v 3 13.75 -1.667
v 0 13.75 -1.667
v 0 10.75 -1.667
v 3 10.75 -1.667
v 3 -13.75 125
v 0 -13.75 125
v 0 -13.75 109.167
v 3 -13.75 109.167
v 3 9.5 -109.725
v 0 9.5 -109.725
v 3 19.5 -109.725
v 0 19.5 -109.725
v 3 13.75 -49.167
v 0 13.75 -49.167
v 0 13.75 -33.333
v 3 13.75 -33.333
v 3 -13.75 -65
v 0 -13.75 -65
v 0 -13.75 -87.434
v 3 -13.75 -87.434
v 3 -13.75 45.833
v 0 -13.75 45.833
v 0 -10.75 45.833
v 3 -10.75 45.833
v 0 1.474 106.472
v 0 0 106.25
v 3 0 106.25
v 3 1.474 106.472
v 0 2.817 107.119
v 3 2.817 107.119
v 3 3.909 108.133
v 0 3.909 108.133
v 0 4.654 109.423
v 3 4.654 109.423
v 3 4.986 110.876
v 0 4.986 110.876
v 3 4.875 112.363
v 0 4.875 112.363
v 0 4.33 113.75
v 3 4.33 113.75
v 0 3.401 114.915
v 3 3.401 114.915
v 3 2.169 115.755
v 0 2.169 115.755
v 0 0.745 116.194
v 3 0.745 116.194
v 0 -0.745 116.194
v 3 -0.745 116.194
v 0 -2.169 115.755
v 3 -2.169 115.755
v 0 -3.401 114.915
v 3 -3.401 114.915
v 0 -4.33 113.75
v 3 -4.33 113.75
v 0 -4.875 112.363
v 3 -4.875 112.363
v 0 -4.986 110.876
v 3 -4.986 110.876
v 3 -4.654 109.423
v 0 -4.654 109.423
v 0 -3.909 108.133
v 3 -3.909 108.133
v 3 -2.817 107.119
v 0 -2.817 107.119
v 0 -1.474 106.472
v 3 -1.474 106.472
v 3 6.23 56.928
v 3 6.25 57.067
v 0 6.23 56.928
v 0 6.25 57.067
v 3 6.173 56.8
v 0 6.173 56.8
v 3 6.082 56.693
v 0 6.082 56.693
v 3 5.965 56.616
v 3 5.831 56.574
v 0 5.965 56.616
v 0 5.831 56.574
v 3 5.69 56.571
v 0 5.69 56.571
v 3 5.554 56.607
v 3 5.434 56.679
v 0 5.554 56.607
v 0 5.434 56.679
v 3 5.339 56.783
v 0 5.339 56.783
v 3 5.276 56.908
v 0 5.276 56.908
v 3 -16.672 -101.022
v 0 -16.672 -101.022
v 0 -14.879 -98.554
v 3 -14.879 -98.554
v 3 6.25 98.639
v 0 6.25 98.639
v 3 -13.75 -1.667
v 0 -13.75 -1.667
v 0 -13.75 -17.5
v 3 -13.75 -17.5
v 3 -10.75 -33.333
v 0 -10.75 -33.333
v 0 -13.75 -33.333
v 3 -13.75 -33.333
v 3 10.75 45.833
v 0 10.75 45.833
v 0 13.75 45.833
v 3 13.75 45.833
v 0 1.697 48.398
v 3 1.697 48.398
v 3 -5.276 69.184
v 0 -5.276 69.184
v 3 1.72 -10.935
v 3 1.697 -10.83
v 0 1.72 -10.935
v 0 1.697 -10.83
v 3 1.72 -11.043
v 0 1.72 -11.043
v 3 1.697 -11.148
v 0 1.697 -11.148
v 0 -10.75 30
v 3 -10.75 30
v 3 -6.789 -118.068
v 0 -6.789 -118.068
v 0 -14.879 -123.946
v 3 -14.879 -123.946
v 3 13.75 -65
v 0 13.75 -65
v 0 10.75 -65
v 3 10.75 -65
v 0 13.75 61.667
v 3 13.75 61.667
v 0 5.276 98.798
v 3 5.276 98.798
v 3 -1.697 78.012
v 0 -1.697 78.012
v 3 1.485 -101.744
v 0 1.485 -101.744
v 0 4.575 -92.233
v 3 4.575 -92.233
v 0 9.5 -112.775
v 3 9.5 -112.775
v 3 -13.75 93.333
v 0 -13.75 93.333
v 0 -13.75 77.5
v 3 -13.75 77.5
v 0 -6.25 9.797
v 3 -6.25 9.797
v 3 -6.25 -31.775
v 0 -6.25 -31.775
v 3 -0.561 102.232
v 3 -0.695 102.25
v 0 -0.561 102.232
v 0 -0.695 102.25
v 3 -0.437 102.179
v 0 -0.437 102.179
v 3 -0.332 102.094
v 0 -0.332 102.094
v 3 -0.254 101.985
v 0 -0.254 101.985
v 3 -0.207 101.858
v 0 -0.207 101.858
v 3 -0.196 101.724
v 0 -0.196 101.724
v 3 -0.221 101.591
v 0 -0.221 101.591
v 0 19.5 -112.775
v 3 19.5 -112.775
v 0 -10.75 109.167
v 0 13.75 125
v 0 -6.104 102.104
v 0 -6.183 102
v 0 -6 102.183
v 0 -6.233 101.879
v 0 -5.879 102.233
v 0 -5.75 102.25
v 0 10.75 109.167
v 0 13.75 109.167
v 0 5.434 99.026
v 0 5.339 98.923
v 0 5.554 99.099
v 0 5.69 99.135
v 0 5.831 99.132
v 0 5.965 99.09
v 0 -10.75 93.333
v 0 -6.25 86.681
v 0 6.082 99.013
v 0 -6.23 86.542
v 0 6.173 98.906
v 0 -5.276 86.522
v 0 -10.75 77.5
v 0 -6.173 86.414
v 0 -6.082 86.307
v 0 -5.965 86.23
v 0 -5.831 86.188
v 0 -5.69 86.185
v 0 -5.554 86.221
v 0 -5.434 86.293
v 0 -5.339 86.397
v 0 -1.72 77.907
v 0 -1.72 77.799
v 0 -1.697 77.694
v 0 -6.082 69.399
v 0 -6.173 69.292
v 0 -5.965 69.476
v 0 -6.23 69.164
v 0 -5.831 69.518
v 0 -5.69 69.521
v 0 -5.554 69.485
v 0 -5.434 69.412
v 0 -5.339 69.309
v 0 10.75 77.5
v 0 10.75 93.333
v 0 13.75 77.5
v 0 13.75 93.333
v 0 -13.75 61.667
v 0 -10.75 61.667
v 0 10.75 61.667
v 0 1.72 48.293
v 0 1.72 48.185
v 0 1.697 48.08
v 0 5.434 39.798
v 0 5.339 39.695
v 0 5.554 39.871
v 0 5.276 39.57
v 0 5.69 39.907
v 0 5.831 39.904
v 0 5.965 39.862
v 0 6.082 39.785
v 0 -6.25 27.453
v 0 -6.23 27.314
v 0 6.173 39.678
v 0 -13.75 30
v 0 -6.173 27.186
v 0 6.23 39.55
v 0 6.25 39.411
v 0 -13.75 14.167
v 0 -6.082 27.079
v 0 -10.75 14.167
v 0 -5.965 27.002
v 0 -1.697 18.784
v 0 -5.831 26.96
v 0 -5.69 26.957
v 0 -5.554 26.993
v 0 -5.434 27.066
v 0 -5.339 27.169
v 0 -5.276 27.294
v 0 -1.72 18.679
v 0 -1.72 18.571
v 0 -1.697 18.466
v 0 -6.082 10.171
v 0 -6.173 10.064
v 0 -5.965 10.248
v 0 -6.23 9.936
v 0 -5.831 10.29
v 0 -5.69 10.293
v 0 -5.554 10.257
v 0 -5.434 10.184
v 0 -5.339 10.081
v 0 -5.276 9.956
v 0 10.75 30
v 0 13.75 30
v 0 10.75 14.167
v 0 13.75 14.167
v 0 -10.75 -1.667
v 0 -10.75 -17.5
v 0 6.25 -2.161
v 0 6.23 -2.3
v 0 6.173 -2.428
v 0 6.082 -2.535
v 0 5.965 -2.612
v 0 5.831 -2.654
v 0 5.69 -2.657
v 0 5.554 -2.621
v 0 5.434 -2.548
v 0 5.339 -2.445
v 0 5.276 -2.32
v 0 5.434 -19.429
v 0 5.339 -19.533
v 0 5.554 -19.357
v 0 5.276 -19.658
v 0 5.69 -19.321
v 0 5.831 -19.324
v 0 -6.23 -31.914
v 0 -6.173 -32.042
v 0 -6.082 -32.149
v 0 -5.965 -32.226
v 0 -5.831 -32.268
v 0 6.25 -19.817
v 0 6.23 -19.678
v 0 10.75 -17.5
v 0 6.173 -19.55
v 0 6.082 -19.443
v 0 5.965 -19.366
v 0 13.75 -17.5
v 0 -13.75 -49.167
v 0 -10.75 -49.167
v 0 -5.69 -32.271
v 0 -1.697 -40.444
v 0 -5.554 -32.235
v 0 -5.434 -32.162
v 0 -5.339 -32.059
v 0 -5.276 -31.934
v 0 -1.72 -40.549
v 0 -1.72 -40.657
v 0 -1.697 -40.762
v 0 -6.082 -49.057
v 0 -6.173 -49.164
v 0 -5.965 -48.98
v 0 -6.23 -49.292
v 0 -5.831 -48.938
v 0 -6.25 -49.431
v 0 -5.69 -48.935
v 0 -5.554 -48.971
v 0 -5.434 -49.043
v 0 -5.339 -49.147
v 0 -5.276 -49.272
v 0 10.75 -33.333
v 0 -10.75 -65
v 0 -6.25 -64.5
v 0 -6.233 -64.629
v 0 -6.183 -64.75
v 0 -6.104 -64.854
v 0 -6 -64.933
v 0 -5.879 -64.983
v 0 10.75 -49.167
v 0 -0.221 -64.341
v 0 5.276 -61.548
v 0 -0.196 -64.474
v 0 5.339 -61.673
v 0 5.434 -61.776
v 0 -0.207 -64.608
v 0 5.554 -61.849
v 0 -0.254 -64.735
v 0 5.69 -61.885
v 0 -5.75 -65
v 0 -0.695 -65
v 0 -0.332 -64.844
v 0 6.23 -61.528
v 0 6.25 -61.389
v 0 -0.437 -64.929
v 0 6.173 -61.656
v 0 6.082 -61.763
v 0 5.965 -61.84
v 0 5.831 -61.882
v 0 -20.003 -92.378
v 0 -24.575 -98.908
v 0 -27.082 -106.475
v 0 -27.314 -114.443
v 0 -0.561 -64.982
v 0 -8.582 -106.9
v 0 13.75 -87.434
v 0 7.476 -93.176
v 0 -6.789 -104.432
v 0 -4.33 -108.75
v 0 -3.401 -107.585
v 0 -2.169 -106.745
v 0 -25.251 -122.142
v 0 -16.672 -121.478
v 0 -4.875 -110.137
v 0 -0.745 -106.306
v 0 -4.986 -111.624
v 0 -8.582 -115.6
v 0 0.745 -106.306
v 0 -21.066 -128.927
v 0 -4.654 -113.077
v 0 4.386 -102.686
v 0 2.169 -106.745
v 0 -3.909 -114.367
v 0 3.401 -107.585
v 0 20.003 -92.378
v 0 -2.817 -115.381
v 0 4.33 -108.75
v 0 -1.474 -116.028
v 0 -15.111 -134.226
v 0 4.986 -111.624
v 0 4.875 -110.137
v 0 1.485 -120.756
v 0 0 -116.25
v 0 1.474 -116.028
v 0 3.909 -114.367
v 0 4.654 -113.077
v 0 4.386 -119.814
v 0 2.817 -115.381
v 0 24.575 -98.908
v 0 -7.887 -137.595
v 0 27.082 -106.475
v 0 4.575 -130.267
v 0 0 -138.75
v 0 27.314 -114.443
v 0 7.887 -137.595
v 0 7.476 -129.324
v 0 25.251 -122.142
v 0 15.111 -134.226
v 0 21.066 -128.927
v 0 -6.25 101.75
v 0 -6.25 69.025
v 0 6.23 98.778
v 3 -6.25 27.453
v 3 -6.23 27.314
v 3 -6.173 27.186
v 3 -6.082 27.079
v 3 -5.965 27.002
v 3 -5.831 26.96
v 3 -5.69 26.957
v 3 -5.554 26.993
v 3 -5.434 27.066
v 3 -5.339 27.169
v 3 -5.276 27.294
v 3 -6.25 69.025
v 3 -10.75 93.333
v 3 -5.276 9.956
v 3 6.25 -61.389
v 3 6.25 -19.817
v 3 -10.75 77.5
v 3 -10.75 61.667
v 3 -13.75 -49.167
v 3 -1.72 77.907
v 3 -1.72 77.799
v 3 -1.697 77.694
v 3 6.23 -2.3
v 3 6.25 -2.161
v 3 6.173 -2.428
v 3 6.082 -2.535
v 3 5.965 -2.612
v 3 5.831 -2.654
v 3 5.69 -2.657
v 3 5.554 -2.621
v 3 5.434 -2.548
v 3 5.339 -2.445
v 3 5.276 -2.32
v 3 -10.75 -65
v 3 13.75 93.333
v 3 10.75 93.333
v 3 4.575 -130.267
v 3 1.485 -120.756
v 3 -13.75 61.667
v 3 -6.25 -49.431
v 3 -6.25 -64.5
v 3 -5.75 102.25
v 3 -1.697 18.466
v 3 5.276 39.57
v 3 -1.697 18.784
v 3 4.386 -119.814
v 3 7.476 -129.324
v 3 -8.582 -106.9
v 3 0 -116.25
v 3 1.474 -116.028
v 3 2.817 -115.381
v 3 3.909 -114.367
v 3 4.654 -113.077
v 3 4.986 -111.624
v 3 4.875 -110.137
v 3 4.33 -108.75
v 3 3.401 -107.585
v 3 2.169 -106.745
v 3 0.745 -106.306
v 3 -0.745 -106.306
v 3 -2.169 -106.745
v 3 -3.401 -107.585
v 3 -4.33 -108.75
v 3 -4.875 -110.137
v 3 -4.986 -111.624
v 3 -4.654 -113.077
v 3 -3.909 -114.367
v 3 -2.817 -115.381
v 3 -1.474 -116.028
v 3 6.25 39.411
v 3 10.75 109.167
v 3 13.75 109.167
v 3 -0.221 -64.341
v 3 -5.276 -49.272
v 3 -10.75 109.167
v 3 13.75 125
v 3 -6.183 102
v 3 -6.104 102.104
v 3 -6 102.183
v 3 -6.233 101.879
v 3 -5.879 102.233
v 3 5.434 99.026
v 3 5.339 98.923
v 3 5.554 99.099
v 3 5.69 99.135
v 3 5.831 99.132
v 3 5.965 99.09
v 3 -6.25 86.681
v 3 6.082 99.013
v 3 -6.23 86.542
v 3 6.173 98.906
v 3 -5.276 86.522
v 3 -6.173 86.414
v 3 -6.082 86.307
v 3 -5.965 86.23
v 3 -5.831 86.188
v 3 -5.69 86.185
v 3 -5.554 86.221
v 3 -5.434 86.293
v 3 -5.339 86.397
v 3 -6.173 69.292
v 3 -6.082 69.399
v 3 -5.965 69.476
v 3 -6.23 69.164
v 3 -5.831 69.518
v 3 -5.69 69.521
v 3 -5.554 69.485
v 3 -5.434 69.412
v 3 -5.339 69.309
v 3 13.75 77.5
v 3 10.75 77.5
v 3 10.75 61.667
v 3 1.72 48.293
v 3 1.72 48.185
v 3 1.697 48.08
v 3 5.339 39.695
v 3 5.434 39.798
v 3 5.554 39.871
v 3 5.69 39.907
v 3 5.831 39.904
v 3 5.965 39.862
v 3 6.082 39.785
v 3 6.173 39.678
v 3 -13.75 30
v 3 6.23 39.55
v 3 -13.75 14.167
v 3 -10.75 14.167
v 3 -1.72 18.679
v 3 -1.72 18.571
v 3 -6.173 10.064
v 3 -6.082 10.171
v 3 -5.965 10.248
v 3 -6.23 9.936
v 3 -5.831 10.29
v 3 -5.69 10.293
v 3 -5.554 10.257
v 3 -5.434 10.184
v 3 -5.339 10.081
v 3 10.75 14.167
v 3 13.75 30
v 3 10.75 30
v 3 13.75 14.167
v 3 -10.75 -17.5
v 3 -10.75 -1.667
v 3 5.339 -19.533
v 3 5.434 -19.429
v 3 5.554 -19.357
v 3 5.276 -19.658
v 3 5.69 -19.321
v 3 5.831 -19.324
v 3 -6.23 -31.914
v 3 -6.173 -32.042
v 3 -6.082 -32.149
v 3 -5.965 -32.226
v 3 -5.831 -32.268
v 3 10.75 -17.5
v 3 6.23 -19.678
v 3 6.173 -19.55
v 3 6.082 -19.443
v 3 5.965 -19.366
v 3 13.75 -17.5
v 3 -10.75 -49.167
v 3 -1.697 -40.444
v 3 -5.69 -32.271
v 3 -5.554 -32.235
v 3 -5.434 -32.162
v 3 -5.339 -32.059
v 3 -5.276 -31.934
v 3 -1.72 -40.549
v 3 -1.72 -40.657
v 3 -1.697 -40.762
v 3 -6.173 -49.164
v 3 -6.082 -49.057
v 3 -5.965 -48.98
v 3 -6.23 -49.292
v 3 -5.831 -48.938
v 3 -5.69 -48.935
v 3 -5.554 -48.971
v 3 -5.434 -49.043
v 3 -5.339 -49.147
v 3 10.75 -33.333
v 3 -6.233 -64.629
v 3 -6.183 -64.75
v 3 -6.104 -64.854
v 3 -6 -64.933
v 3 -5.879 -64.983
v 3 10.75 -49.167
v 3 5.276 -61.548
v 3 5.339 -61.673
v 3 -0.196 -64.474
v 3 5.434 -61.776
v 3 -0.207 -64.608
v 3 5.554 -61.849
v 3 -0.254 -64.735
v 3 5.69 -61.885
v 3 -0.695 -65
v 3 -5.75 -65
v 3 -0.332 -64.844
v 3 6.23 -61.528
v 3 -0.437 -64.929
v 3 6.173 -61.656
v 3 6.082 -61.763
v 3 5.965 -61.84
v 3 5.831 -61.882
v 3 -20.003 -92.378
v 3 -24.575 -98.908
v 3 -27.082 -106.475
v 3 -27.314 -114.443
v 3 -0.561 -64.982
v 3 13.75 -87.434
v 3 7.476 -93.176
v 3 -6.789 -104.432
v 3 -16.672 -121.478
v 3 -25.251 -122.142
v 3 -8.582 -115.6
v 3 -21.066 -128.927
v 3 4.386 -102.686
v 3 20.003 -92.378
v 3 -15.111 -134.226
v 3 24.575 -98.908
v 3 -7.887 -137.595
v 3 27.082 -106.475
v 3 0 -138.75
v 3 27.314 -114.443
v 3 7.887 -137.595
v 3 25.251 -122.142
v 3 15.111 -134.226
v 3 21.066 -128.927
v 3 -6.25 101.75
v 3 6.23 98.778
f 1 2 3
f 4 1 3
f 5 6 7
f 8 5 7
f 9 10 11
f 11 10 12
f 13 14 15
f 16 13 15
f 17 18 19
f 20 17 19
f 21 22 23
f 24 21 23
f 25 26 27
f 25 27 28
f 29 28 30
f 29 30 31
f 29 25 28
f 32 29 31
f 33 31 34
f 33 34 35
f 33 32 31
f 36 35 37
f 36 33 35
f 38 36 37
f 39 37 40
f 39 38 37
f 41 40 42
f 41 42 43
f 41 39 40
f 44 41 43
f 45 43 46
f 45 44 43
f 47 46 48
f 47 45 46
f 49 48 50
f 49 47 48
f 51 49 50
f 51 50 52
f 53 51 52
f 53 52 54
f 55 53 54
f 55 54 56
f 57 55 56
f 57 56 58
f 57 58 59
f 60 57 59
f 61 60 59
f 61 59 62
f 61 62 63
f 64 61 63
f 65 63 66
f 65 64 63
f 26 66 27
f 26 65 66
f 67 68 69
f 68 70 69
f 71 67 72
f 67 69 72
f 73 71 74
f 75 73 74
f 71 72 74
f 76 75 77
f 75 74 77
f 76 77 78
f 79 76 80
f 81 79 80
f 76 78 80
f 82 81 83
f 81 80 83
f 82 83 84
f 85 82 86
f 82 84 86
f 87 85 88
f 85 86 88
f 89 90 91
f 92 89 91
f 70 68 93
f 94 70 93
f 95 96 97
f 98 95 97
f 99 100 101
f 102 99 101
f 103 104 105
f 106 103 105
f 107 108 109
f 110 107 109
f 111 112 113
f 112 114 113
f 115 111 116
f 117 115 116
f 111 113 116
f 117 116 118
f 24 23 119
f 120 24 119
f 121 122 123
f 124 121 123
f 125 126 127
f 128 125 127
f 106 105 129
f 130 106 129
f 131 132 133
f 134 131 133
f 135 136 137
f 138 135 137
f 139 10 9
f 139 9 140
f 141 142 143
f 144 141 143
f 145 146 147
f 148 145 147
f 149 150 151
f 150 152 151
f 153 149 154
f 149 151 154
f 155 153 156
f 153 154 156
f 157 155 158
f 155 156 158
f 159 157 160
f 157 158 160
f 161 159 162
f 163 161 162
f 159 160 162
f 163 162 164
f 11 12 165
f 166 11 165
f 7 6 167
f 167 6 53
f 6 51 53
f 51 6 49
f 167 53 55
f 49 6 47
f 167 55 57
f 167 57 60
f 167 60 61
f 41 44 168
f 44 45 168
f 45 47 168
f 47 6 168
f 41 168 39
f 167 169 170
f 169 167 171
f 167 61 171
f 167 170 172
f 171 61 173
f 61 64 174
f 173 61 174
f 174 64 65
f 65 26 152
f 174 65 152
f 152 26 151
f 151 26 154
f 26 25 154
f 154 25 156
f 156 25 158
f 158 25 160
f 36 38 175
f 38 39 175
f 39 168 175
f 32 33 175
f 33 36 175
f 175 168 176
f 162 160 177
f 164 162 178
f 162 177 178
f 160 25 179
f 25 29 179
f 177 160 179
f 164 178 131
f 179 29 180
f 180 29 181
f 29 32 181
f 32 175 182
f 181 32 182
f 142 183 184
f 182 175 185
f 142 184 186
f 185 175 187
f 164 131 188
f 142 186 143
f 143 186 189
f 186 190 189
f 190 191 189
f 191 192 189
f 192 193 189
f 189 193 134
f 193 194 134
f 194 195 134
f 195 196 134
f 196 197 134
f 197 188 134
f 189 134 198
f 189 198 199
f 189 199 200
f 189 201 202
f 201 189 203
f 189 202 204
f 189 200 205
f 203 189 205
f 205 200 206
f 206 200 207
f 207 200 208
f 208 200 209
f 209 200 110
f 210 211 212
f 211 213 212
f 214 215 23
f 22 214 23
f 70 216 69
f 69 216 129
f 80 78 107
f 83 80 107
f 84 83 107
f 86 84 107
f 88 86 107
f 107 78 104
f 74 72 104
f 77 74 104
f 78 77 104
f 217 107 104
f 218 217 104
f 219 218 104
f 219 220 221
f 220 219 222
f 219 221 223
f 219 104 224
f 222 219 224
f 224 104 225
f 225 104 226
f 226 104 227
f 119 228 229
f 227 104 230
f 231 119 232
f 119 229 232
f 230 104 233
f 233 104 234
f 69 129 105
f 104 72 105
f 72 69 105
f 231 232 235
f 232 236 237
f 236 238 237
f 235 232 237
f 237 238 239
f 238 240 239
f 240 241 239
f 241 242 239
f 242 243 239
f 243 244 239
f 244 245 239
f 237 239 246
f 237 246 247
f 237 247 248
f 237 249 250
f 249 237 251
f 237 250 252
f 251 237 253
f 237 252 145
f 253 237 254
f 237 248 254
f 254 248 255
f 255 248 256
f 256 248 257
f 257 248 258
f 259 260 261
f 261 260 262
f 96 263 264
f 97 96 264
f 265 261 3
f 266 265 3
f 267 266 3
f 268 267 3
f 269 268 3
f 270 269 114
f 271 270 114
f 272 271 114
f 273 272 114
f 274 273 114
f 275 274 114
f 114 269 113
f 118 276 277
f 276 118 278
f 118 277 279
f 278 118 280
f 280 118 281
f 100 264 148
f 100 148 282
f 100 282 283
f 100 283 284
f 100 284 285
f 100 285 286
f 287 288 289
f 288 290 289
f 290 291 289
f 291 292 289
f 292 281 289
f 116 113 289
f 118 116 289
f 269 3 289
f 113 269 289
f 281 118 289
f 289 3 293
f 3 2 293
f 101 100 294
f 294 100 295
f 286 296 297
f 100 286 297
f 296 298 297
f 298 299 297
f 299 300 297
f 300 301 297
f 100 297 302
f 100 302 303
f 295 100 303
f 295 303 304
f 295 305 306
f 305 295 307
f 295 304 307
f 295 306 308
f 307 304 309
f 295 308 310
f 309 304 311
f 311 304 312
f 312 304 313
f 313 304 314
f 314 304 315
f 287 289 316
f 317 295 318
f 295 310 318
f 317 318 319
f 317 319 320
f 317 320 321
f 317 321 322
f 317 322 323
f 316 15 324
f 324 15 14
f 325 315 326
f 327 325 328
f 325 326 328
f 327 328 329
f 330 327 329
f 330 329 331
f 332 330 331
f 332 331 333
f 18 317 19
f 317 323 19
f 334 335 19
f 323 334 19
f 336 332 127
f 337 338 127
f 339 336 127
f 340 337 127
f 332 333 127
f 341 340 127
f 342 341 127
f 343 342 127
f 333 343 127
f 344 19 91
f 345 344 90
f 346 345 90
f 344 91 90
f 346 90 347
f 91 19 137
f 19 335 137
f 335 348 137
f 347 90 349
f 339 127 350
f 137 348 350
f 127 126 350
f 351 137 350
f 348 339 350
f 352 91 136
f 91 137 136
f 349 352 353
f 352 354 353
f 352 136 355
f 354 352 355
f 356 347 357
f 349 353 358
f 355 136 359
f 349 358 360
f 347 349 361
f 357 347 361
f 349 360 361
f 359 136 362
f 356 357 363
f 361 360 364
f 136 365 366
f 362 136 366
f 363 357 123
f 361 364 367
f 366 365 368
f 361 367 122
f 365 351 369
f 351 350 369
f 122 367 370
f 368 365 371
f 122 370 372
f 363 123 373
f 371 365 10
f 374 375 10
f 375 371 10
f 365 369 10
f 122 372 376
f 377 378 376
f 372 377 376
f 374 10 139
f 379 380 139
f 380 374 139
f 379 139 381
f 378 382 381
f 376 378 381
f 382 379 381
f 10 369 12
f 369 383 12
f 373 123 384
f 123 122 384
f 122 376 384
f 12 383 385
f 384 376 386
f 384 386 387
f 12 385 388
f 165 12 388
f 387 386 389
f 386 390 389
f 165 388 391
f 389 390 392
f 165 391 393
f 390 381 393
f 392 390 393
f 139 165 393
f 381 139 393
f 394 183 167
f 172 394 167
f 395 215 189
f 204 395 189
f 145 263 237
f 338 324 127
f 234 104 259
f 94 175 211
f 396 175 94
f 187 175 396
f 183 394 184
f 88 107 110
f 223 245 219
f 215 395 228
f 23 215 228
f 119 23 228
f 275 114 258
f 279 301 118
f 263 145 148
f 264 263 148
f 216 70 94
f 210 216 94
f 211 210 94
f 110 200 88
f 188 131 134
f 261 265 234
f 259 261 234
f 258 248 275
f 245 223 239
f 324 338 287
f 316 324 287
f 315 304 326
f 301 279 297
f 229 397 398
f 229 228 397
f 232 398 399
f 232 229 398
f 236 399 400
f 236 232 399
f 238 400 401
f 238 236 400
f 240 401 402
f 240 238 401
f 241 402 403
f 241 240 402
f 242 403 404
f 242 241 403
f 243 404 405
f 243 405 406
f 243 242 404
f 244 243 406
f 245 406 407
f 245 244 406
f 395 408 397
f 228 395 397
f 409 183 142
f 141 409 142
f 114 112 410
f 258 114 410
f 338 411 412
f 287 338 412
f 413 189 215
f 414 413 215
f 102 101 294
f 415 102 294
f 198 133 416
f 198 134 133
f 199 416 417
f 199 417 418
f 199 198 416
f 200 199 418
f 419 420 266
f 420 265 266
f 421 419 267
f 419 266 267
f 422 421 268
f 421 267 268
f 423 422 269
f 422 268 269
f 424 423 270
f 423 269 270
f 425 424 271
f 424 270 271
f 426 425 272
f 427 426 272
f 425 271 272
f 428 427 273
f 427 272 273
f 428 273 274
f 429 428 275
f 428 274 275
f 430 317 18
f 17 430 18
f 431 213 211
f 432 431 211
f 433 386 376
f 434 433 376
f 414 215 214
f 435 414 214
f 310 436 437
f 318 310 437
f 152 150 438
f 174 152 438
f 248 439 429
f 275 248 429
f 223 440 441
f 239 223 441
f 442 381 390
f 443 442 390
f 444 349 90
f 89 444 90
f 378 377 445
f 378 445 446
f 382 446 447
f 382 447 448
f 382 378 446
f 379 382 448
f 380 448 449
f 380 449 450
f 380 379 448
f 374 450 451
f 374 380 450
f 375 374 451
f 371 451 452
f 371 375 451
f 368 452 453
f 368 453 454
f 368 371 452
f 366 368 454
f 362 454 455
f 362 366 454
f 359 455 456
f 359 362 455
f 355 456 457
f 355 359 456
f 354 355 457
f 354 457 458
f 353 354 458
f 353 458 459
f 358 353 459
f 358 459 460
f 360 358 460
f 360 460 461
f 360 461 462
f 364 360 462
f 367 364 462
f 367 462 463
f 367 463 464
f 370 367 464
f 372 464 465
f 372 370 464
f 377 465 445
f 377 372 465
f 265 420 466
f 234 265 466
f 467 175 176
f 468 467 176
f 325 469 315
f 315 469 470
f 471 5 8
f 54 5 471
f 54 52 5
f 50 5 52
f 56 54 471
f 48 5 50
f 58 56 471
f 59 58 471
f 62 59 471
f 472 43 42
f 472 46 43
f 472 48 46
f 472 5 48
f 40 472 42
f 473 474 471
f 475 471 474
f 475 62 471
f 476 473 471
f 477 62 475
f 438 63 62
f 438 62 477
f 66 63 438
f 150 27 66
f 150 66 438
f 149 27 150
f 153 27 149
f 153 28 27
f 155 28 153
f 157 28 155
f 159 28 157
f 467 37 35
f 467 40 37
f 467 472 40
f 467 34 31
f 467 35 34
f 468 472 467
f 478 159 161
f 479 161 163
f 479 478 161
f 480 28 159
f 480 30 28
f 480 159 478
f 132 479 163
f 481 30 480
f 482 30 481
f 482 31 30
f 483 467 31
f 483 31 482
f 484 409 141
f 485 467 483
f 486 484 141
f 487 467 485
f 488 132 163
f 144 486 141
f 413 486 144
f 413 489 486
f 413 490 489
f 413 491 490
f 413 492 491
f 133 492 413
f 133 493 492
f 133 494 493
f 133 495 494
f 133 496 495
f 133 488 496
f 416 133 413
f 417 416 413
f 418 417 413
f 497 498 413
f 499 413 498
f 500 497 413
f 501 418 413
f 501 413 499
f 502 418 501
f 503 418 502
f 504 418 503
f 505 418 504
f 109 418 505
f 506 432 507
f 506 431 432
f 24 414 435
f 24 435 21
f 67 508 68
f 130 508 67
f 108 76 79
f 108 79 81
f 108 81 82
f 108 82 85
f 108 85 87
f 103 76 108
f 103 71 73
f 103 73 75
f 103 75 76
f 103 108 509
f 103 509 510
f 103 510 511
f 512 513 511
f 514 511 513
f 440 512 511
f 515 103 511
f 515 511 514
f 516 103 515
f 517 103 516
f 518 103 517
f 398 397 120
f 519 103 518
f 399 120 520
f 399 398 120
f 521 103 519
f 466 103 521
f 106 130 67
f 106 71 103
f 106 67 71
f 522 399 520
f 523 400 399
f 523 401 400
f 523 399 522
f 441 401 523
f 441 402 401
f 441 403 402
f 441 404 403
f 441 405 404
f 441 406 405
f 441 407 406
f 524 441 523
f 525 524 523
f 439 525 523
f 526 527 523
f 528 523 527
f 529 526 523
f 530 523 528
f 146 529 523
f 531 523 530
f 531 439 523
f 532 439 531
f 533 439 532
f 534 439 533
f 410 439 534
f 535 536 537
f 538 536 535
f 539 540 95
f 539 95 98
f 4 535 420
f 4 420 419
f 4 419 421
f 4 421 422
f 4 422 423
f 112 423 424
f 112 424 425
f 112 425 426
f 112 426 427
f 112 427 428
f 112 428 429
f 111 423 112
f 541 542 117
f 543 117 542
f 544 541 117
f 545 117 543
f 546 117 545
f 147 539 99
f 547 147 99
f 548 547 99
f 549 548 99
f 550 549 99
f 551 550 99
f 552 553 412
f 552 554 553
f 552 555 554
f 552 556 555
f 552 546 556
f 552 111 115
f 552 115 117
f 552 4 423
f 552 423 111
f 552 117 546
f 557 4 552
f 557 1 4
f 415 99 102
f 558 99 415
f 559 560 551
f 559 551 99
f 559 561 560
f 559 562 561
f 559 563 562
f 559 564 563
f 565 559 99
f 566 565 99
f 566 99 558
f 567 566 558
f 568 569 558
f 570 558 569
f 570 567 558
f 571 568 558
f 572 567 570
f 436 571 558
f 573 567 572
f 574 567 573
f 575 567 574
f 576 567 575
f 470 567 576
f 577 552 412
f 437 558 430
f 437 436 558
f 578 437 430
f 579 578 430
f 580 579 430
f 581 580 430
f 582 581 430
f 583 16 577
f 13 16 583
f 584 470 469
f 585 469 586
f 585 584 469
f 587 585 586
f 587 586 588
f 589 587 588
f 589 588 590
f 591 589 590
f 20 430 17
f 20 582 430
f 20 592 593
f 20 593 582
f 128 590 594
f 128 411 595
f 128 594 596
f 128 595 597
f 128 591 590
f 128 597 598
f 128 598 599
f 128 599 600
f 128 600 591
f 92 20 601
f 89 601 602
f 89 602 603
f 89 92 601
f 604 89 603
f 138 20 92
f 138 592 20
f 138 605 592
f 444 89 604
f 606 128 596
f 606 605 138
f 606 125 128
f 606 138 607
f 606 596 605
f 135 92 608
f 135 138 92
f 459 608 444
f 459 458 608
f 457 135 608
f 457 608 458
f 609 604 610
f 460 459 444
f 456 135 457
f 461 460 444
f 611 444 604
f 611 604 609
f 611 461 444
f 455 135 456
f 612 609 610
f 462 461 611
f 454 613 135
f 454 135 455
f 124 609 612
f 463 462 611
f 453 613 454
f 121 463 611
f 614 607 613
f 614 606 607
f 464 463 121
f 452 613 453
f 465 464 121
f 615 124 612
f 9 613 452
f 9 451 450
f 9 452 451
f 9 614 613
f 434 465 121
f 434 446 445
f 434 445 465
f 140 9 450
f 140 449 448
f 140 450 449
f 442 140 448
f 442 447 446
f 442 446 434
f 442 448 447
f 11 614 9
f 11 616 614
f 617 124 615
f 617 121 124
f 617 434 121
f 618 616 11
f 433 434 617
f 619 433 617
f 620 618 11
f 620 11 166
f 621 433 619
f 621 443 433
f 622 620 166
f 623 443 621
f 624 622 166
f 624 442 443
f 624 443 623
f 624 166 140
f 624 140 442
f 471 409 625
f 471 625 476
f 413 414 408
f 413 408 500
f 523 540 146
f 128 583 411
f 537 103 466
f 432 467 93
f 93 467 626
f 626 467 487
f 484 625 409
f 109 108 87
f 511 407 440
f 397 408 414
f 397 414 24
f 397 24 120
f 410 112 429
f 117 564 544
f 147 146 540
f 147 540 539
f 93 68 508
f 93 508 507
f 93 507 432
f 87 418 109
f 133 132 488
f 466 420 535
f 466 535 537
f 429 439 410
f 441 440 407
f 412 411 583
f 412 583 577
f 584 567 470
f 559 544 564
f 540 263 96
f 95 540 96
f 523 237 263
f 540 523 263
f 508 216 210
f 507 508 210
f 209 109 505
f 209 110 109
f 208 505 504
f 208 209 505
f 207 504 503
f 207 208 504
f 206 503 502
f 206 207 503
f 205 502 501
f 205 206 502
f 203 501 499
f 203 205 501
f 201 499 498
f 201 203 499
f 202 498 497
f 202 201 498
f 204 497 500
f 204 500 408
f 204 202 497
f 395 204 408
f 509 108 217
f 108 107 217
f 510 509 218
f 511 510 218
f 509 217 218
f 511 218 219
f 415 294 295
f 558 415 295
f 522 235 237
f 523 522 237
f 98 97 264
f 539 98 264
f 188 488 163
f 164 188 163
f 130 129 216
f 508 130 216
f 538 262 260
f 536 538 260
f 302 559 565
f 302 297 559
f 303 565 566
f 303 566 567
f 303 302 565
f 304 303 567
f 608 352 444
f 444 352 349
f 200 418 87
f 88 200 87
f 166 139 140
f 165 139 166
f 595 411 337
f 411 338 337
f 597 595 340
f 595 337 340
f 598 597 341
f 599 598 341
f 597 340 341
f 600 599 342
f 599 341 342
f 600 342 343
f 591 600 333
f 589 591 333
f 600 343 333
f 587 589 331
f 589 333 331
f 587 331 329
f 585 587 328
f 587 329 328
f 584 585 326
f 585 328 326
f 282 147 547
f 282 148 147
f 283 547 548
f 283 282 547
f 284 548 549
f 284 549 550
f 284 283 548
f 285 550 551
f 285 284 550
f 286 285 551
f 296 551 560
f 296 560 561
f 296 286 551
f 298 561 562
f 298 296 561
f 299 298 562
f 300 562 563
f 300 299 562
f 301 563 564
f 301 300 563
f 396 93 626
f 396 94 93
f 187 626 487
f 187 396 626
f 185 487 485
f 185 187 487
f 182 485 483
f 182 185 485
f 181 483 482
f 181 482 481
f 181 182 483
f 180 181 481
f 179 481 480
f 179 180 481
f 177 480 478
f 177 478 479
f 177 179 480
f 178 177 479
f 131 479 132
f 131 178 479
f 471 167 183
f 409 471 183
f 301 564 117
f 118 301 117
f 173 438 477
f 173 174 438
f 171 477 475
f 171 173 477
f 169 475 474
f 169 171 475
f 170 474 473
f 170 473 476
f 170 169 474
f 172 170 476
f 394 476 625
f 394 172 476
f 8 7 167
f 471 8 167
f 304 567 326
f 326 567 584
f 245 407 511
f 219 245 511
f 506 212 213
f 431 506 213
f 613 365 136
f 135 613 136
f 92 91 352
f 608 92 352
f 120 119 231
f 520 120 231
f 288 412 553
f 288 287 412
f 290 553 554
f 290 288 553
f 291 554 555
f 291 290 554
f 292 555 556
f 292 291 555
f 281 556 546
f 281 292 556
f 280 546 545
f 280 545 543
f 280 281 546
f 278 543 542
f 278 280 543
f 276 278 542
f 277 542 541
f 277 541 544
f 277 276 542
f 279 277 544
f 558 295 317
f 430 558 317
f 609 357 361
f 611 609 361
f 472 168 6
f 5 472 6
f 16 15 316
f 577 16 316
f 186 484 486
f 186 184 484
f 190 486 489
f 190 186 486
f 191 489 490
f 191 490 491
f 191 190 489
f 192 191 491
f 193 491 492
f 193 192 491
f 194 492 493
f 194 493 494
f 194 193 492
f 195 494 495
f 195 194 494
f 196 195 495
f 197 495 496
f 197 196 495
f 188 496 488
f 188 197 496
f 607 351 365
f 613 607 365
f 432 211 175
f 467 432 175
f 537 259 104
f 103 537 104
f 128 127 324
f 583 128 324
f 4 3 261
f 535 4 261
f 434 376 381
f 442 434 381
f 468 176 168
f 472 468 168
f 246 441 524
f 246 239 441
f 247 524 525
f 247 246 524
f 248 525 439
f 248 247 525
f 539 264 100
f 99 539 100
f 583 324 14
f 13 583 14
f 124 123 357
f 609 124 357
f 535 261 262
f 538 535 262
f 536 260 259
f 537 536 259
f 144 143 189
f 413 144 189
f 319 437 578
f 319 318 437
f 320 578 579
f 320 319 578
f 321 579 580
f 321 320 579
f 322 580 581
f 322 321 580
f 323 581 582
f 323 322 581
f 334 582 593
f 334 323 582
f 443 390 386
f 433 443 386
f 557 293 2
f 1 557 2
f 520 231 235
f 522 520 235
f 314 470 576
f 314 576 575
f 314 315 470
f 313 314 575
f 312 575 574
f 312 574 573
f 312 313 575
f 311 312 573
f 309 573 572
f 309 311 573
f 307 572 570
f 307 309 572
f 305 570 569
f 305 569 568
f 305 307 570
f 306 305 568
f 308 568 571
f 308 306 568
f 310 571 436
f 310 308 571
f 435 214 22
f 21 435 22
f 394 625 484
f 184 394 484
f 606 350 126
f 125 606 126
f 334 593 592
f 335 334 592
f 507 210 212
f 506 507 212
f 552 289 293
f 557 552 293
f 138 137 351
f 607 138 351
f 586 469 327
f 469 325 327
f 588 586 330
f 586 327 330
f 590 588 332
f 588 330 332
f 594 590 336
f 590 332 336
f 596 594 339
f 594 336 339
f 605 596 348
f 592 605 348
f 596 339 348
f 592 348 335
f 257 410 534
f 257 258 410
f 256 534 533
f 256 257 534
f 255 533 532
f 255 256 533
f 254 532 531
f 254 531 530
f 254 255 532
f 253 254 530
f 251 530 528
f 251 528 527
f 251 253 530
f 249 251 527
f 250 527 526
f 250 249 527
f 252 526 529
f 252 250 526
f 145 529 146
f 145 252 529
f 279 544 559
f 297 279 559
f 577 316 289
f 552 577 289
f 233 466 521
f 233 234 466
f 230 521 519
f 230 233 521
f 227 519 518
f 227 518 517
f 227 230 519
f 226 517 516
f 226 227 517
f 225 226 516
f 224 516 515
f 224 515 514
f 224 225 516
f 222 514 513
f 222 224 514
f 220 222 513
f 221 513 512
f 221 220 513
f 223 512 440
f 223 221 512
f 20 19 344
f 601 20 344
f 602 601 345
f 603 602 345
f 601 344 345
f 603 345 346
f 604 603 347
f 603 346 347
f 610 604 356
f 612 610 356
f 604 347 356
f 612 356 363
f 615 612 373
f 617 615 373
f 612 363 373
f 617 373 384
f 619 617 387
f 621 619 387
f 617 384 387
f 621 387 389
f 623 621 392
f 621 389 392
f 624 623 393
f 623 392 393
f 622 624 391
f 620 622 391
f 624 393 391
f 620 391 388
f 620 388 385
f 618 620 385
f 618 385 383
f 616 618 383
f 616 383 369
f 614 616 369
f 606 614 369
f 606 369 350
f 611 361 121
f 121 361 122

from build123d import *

# Parameters (mm, degrees)
SKETCH1_W           = 3.05
SKETCH1_H           = 10
SKETCH1_R           = 5
BOSS_EXTRUDE1_DEPTH = 3
CUT_EXTRUDE1_DEPTH  = 3
FILLET1_R           = 0.5


with BuildPart() as part:
    # Sketch1 → Boss-Extrude1 (new body)
    with BuildSketch(Plane(origin=(0, 0, 0), x_dir=(0, 0, -1), z_dir=(1, 0, 0))):
        with BuildLine():
            Line((-125, 13.75), (-125, -13.75))
            Line((-125, -13.75), (-109.166666667, -13.75))
            Line((-109.166666667, -13.75), (-109.166666667, -10.75))
            Line((-109.166666667, -10.75), (-93.333333333, -10.75))
            Line((-93.333333333, -10.75), (-93.333333333, -13.75))
            Line((-93.333333333, -13.75), (-77.5, -13.75))
            Line((-77.5, -13.75), (-77.5, -10.75))
            Line((-77.5, -10.75), (-61.666666667, -10.75))
            Line((-61.666666667, -10.75), (-61.666666667, -13.75))
            Line((-61.666666667, -13.75), (-45.833333333, -13.75))
            Line((-45.833333333, -13.75), (-45.833333333, -10.75))
            Line((-45.833333333, -10.75), (-30, -10.75))
            Line((-30, -10.75), (-30, -13.75))
            Line((-30, -13.75), (-14.166666667, -13.75))
            Line((-14.166666667, -13.75), (-14.166666667, -10.75))
            Line((-14.166666667, -10.75), (1.666666667, -10.75))
            Line((1.666666667, -10.75), (1.666666667, -13.75))
            Line((1.666666667, -13.75), (17.5, -13.75))
            Line((17.5, -13.75), (17.5, -10.75))
            Line((17.5, -10.75), (33.333333333, -10.75))
            Line((33.333333333, -10.75), (33.333333333, -13.75))
            Line((33.333333333, -13.75), (49.166666667, -13.75))
            Line((49.166666667, -13.75), (49.166666667, -10.75))
            Line((49.166666667, -10.75), (65, -10.75))
            Line((65, -10.75), (65, -13.75))
            Line((65, -13.75), (87.434301396, -13.75))
            ThreePointArc((87.434301396, -13.75), (138.75, 0), (87.434301396, 13.75))
            Line((87.434301396, 13.75), (65, 13.75))
            Line((65, 13.75), (65, 10.75))
            Line((65, 10.75), (49.166666667, 10.75))
            Line((49.166666667, 10.75), (49.166666667, 13.75))
            Line((49.166666667, 13.75), (33.333333333, 13.75))
            Line((33.333333333, 13.75), (33.333333333, 10.75))
            Line((33.333333333, 10.75), (17.5, 10.75))
            Line((17.5, 10.75), (17.5, 13.75))
            Line((17.5, 13.75), (1.666666667, 13.75))
            Line((1.666666667, 13.75), (1.666666667, 10.75))
            Line((1.666666667, 10.75), (-14.166666667, 10.75))
            Line((-14.166666667, 10.75), (-14.166666667, 13.75))
            Line((-14.166666667, 13.75), (-30, 13.75))
            Line((-30, 13.75), (-30, 10.75))
            Line((-30, 10.75), (-45.833333333, 10.75))
            Line((-45.833333333, 10.75), (-45.833333333, 13.75))
            Line((-45.833333333, 13.75), (-61.666666667, 13.75))
            Line((-61.666666667, 13.75), (-61.666666667, 10.75))
            Line((-61.666666667, 10.75), (-77.5, 10.75))
            Line((-77.5, 10.75), (-77.5, 13.75))
            Line((-77.5, 13.75), (-93.333333333, 13.75))
            Line((-93.333333333, 13.75), (-93.333333333, 10.75))
            Line((-93.333333333, 10.75), (-109.166666667, 10.75))
            Line((-109.166666667, 10.75), (-109.166666667, 13.75))
            Line((-109.166666667, 13.75), (-125, 13.75))
        make_face()
        Polygon((104.432289187, -6.789288937), (106.89979102, -8.582033956), (101.021938497, -16.6722039), (98.554436664, -14.879458881), align=None, mode=Mode.SUBTRACT)
        Polygon((115.60020898, -8.582033956), (118.067710813, -6.789288937), (123.945563336, -14.879458881), (121.478061503, -16.6722039), align=None, mode=Mode.SUBTRACT)
        Polygon((120.756287821, 1.485300259), (119.813785988, 4.386022634), (129.324351151, 7.476192578), (130.266852984, 4.575470203), align=None, mode=Mode.SUBTRACT)
        with Locations((111.25, 14.5)):
            Rectangle(SKETCH1_W, SKETCH1_H, mode=Mode.SUBTRACT)
        with Locations((-111.25, 0)):
            Circle(SKETCH1_R, mode=Mode.SUBTRACT)
        with Locations((111.25, 0)):
            Circle(SKETCH1_R, mode=Mode.SUBTRACT)
        Polygon((102.686214012, 4.386022634), (101.743712179, 1.485300259), (92.233147016, 4.575470203), (93.175648849, 7.476192578), align=None, mode=Mode.SUBTRACT)
    extrude(amount=BOSS_EXTRUDE1_DEPTH)

    # Sketch3 → Cut-Extrude1 (cut)
    with BuildSketch(Plane(origin=(3, 0, 0), x_dir=(0, 0, -1), z_dir=(1, 0, 0))):
        Polygon((-102.25, 0), (-102.25, -6.25), (-83.618433679, -6.25), align=None)
        Polygon((-54.004487489, 6.25), (-101.701297271, 6.25), (-77.85289238, -1.75), align=None)
        Polygon((-48.23894619, 1.75), (-72.087351081, -6.25), (-24.390541299, -6.25), align=None)
        Polygon((5.223404891, 6.25), (-42.473404891, 6.25), (-18.625, -1.75), align=None)
        Polygon((10.98894619, 1.75), (-12.859458701, -6.25), (34.837351081, -6.25), align=None)
        Polygon((64.451297271, 6.25), (16.754487489, 6.25), (40.60289238, -1.75), align=None)
        Polygon((65, 0), (46.368433679, -6.25), (65, -6.25), align=None)
    extrude(amount=-CUT_EXTRUDE1_DEPTH, mode=Mode.SUBTRACT)

    # Fillet1
    fillet1_edges = [part.edges().sort_by_distance(p)[0] for p in [
        (1.5, -1.75, 18.625),
        (1.5, 6.25, 42.473404891),
        (1.5, 6.25, -5.223404891),
        (1.5, 1.75, -10.98894619),
        (1.5, -6.25, -34.837351081),
        (1.5, -6.25, 12.859458701),
        (1.5, -1.75, 77.85289238),
        (1.5, 6.25, 101.701297271),
        (1.5, 6.25, 54.004487489),
        (1.5, 1.75, 48.23894619),
        (1.5, -6.25, 24.390541299),
        (1.5, -6.25, 72.087351081),
        (1.5, -6.25, -46.368433679),
        (1.5, 0, -65),
        (1.5, -6.25, -65),
        (1.5, -1.75, -40.60289238),
        (1.5, 6.25, -16.754487489),
        (1.5, 6.25, -64.451297271),
        (1.5, 0, 102.25),
        (1.5, -6.25, 83.618433679),
        (1.5, -6.25, 102.25),
    ]]
    fillet(fillet1_edges, radius=FILLET1_R)


solid = part.part
